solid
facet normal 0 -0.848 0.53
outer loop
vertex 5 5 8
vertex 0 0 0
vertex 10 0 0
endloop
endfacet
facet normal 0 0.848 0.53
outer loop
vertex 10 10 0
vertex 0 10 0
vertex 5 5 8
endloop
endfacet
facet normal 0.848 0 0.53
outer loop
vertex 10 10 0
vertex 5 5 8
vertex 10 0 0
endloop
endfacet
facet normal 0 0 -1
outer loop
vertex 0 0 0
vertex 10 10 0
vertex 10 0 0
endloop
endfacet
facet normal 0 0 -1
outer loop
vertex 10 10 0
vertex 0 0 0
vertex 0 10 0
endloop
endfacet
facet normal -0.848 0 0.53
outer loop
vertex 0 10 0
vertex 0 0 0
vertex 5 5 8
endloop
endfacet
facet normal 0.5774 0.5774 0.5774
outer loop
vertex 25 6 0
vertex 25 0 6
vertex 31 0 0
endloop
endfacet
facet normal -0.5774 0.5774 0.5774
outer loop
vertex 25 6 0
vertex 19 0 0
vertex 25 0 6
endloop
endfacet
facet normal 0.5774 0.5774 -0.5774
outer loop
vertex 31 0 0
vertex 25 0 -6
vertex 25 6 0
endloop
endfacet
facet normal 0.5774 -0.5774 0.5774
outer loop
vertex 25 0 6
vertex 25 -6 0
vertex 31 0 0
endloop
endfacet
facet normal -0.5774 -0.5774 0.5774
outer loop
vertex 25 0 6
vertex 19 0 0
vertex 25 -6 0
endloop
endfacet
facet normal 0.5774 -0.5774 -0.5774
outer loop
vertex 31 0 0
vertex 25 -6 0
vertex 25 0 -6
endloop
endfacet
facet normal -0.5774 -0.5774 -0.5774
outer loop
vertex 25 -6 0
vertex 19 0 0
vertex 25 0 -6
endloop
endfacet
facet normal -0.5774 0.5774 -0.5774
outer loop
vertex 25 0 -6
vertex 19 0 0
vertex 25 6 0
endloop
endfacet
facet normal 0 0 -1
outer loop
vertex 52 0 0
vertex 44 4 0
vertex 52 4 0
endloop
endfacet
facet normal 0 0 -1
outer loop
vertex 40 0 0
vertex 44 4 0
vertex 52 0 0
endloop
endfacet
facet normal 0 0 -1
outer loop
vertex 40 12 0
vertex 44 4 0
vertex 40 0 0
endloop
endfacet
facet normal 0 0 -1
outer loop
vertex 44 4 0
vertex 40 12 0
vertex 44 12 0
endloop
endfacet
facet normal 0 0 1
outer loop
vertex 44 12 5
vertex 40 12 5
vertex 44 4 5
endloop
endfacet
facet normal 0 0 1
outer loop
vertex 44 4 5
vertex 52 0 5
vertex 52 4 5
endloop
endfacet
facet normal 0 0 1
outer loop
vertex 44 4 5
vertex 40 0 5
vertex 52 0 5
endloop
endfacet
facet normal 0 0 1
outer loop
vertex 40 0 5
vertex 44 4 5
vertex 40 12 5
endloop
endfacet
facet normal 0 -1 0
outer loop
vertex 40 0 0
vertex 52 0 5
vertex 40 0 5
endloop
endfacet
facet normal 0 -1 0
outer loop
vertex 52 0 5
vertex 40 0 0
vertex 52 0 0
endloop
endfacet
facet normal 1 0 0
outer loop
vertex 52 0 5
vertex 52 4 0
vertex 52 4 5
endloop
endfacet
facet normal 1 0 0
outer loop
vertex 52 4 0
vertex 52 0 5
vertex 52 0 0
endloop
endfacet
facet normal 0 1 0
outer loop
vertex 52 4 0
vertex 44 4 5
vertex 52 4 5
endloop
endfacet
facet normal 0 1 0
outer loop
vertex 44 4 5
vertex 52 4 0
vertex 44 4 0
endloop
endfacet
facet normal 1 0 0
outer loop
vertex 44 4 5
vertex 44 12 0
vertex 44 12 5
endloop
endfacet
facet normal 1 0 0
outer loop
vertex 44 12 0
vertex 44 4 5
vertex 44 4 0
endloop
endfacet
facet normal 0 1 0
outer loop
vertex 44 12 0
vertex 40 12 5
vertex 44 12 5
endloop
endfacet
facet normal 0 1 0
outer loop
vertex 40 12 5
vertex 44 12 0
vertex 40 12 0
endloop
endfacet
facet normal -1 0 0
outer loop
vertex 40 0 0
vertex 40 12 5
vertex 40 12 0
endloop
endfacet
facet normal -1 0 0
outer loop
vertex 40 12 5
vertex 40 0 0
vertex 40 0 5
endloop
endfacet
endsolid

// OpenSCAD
// Original CanvasNet test fixture: polyhedra whose faces are listed clockwise when seen from outside.
// A square pyramid (x 0..10), an octahedron (centered at x = 25) and an L-shaped prism (x 40..52), which has
// a concave top and bottom face.

// Pyramid: 10 x 10 base on z = 0, apex at (5, 5, 8)
polyhedron(
  points = [[0, 0, 0], [10, 0, 0], [10, 10, 0], [0, 10, 0], [5, 5, 8]],
  faces = [[1, 0, 4], [2, 1, 4], [3, 2, 4], [0, 3, 4], [0, 1, 2, 3]]
);

// Octahedron: vertices at distance 6 from the center (25, 0, 0) along each axis
translate([25, 0, 0]) polyhedron(
  points = [[6, 0, 0], [-6, 0, 0], [0, 6, 0], [0, -6, 0], [0, 0, 6], [0, 0, -6]],
  faces = [[0, 4, 2], [1, 2, 4], [0, 3, 4], [1, 4, 3], [0, 2, 5], [1, 5, 2], [0, 5, 3], [1, 3, 5]]
);

// L-shaped prism: the L is 12 x 12 with arms 4 wide, the prism is 5 tall
translate([40, 0, 0]) polyhedron(
  points = [
    [0, 0, 0], [12, 0, 0], [12, 4, 0], [4, 4, 0], [4, 12, 0], [0, 12, 0],
    [0, 0, 5], [12, 0, 5], [12, 4, 5], [4, 4, 5], [4, 12, 5], [0, 12, 5]
  ],
  faces = [
    [0, 1, 2, 3, 4, 5],
    [11, 10, 9, 8, 7, 6],
    [0, 6, 7, 1], [1, 7, 8, 2], [2, 8, 9, 3], [3, 9, 10, 4], [4, 10, 11, 5], [5, 11, 6, 0]
  ]
);
